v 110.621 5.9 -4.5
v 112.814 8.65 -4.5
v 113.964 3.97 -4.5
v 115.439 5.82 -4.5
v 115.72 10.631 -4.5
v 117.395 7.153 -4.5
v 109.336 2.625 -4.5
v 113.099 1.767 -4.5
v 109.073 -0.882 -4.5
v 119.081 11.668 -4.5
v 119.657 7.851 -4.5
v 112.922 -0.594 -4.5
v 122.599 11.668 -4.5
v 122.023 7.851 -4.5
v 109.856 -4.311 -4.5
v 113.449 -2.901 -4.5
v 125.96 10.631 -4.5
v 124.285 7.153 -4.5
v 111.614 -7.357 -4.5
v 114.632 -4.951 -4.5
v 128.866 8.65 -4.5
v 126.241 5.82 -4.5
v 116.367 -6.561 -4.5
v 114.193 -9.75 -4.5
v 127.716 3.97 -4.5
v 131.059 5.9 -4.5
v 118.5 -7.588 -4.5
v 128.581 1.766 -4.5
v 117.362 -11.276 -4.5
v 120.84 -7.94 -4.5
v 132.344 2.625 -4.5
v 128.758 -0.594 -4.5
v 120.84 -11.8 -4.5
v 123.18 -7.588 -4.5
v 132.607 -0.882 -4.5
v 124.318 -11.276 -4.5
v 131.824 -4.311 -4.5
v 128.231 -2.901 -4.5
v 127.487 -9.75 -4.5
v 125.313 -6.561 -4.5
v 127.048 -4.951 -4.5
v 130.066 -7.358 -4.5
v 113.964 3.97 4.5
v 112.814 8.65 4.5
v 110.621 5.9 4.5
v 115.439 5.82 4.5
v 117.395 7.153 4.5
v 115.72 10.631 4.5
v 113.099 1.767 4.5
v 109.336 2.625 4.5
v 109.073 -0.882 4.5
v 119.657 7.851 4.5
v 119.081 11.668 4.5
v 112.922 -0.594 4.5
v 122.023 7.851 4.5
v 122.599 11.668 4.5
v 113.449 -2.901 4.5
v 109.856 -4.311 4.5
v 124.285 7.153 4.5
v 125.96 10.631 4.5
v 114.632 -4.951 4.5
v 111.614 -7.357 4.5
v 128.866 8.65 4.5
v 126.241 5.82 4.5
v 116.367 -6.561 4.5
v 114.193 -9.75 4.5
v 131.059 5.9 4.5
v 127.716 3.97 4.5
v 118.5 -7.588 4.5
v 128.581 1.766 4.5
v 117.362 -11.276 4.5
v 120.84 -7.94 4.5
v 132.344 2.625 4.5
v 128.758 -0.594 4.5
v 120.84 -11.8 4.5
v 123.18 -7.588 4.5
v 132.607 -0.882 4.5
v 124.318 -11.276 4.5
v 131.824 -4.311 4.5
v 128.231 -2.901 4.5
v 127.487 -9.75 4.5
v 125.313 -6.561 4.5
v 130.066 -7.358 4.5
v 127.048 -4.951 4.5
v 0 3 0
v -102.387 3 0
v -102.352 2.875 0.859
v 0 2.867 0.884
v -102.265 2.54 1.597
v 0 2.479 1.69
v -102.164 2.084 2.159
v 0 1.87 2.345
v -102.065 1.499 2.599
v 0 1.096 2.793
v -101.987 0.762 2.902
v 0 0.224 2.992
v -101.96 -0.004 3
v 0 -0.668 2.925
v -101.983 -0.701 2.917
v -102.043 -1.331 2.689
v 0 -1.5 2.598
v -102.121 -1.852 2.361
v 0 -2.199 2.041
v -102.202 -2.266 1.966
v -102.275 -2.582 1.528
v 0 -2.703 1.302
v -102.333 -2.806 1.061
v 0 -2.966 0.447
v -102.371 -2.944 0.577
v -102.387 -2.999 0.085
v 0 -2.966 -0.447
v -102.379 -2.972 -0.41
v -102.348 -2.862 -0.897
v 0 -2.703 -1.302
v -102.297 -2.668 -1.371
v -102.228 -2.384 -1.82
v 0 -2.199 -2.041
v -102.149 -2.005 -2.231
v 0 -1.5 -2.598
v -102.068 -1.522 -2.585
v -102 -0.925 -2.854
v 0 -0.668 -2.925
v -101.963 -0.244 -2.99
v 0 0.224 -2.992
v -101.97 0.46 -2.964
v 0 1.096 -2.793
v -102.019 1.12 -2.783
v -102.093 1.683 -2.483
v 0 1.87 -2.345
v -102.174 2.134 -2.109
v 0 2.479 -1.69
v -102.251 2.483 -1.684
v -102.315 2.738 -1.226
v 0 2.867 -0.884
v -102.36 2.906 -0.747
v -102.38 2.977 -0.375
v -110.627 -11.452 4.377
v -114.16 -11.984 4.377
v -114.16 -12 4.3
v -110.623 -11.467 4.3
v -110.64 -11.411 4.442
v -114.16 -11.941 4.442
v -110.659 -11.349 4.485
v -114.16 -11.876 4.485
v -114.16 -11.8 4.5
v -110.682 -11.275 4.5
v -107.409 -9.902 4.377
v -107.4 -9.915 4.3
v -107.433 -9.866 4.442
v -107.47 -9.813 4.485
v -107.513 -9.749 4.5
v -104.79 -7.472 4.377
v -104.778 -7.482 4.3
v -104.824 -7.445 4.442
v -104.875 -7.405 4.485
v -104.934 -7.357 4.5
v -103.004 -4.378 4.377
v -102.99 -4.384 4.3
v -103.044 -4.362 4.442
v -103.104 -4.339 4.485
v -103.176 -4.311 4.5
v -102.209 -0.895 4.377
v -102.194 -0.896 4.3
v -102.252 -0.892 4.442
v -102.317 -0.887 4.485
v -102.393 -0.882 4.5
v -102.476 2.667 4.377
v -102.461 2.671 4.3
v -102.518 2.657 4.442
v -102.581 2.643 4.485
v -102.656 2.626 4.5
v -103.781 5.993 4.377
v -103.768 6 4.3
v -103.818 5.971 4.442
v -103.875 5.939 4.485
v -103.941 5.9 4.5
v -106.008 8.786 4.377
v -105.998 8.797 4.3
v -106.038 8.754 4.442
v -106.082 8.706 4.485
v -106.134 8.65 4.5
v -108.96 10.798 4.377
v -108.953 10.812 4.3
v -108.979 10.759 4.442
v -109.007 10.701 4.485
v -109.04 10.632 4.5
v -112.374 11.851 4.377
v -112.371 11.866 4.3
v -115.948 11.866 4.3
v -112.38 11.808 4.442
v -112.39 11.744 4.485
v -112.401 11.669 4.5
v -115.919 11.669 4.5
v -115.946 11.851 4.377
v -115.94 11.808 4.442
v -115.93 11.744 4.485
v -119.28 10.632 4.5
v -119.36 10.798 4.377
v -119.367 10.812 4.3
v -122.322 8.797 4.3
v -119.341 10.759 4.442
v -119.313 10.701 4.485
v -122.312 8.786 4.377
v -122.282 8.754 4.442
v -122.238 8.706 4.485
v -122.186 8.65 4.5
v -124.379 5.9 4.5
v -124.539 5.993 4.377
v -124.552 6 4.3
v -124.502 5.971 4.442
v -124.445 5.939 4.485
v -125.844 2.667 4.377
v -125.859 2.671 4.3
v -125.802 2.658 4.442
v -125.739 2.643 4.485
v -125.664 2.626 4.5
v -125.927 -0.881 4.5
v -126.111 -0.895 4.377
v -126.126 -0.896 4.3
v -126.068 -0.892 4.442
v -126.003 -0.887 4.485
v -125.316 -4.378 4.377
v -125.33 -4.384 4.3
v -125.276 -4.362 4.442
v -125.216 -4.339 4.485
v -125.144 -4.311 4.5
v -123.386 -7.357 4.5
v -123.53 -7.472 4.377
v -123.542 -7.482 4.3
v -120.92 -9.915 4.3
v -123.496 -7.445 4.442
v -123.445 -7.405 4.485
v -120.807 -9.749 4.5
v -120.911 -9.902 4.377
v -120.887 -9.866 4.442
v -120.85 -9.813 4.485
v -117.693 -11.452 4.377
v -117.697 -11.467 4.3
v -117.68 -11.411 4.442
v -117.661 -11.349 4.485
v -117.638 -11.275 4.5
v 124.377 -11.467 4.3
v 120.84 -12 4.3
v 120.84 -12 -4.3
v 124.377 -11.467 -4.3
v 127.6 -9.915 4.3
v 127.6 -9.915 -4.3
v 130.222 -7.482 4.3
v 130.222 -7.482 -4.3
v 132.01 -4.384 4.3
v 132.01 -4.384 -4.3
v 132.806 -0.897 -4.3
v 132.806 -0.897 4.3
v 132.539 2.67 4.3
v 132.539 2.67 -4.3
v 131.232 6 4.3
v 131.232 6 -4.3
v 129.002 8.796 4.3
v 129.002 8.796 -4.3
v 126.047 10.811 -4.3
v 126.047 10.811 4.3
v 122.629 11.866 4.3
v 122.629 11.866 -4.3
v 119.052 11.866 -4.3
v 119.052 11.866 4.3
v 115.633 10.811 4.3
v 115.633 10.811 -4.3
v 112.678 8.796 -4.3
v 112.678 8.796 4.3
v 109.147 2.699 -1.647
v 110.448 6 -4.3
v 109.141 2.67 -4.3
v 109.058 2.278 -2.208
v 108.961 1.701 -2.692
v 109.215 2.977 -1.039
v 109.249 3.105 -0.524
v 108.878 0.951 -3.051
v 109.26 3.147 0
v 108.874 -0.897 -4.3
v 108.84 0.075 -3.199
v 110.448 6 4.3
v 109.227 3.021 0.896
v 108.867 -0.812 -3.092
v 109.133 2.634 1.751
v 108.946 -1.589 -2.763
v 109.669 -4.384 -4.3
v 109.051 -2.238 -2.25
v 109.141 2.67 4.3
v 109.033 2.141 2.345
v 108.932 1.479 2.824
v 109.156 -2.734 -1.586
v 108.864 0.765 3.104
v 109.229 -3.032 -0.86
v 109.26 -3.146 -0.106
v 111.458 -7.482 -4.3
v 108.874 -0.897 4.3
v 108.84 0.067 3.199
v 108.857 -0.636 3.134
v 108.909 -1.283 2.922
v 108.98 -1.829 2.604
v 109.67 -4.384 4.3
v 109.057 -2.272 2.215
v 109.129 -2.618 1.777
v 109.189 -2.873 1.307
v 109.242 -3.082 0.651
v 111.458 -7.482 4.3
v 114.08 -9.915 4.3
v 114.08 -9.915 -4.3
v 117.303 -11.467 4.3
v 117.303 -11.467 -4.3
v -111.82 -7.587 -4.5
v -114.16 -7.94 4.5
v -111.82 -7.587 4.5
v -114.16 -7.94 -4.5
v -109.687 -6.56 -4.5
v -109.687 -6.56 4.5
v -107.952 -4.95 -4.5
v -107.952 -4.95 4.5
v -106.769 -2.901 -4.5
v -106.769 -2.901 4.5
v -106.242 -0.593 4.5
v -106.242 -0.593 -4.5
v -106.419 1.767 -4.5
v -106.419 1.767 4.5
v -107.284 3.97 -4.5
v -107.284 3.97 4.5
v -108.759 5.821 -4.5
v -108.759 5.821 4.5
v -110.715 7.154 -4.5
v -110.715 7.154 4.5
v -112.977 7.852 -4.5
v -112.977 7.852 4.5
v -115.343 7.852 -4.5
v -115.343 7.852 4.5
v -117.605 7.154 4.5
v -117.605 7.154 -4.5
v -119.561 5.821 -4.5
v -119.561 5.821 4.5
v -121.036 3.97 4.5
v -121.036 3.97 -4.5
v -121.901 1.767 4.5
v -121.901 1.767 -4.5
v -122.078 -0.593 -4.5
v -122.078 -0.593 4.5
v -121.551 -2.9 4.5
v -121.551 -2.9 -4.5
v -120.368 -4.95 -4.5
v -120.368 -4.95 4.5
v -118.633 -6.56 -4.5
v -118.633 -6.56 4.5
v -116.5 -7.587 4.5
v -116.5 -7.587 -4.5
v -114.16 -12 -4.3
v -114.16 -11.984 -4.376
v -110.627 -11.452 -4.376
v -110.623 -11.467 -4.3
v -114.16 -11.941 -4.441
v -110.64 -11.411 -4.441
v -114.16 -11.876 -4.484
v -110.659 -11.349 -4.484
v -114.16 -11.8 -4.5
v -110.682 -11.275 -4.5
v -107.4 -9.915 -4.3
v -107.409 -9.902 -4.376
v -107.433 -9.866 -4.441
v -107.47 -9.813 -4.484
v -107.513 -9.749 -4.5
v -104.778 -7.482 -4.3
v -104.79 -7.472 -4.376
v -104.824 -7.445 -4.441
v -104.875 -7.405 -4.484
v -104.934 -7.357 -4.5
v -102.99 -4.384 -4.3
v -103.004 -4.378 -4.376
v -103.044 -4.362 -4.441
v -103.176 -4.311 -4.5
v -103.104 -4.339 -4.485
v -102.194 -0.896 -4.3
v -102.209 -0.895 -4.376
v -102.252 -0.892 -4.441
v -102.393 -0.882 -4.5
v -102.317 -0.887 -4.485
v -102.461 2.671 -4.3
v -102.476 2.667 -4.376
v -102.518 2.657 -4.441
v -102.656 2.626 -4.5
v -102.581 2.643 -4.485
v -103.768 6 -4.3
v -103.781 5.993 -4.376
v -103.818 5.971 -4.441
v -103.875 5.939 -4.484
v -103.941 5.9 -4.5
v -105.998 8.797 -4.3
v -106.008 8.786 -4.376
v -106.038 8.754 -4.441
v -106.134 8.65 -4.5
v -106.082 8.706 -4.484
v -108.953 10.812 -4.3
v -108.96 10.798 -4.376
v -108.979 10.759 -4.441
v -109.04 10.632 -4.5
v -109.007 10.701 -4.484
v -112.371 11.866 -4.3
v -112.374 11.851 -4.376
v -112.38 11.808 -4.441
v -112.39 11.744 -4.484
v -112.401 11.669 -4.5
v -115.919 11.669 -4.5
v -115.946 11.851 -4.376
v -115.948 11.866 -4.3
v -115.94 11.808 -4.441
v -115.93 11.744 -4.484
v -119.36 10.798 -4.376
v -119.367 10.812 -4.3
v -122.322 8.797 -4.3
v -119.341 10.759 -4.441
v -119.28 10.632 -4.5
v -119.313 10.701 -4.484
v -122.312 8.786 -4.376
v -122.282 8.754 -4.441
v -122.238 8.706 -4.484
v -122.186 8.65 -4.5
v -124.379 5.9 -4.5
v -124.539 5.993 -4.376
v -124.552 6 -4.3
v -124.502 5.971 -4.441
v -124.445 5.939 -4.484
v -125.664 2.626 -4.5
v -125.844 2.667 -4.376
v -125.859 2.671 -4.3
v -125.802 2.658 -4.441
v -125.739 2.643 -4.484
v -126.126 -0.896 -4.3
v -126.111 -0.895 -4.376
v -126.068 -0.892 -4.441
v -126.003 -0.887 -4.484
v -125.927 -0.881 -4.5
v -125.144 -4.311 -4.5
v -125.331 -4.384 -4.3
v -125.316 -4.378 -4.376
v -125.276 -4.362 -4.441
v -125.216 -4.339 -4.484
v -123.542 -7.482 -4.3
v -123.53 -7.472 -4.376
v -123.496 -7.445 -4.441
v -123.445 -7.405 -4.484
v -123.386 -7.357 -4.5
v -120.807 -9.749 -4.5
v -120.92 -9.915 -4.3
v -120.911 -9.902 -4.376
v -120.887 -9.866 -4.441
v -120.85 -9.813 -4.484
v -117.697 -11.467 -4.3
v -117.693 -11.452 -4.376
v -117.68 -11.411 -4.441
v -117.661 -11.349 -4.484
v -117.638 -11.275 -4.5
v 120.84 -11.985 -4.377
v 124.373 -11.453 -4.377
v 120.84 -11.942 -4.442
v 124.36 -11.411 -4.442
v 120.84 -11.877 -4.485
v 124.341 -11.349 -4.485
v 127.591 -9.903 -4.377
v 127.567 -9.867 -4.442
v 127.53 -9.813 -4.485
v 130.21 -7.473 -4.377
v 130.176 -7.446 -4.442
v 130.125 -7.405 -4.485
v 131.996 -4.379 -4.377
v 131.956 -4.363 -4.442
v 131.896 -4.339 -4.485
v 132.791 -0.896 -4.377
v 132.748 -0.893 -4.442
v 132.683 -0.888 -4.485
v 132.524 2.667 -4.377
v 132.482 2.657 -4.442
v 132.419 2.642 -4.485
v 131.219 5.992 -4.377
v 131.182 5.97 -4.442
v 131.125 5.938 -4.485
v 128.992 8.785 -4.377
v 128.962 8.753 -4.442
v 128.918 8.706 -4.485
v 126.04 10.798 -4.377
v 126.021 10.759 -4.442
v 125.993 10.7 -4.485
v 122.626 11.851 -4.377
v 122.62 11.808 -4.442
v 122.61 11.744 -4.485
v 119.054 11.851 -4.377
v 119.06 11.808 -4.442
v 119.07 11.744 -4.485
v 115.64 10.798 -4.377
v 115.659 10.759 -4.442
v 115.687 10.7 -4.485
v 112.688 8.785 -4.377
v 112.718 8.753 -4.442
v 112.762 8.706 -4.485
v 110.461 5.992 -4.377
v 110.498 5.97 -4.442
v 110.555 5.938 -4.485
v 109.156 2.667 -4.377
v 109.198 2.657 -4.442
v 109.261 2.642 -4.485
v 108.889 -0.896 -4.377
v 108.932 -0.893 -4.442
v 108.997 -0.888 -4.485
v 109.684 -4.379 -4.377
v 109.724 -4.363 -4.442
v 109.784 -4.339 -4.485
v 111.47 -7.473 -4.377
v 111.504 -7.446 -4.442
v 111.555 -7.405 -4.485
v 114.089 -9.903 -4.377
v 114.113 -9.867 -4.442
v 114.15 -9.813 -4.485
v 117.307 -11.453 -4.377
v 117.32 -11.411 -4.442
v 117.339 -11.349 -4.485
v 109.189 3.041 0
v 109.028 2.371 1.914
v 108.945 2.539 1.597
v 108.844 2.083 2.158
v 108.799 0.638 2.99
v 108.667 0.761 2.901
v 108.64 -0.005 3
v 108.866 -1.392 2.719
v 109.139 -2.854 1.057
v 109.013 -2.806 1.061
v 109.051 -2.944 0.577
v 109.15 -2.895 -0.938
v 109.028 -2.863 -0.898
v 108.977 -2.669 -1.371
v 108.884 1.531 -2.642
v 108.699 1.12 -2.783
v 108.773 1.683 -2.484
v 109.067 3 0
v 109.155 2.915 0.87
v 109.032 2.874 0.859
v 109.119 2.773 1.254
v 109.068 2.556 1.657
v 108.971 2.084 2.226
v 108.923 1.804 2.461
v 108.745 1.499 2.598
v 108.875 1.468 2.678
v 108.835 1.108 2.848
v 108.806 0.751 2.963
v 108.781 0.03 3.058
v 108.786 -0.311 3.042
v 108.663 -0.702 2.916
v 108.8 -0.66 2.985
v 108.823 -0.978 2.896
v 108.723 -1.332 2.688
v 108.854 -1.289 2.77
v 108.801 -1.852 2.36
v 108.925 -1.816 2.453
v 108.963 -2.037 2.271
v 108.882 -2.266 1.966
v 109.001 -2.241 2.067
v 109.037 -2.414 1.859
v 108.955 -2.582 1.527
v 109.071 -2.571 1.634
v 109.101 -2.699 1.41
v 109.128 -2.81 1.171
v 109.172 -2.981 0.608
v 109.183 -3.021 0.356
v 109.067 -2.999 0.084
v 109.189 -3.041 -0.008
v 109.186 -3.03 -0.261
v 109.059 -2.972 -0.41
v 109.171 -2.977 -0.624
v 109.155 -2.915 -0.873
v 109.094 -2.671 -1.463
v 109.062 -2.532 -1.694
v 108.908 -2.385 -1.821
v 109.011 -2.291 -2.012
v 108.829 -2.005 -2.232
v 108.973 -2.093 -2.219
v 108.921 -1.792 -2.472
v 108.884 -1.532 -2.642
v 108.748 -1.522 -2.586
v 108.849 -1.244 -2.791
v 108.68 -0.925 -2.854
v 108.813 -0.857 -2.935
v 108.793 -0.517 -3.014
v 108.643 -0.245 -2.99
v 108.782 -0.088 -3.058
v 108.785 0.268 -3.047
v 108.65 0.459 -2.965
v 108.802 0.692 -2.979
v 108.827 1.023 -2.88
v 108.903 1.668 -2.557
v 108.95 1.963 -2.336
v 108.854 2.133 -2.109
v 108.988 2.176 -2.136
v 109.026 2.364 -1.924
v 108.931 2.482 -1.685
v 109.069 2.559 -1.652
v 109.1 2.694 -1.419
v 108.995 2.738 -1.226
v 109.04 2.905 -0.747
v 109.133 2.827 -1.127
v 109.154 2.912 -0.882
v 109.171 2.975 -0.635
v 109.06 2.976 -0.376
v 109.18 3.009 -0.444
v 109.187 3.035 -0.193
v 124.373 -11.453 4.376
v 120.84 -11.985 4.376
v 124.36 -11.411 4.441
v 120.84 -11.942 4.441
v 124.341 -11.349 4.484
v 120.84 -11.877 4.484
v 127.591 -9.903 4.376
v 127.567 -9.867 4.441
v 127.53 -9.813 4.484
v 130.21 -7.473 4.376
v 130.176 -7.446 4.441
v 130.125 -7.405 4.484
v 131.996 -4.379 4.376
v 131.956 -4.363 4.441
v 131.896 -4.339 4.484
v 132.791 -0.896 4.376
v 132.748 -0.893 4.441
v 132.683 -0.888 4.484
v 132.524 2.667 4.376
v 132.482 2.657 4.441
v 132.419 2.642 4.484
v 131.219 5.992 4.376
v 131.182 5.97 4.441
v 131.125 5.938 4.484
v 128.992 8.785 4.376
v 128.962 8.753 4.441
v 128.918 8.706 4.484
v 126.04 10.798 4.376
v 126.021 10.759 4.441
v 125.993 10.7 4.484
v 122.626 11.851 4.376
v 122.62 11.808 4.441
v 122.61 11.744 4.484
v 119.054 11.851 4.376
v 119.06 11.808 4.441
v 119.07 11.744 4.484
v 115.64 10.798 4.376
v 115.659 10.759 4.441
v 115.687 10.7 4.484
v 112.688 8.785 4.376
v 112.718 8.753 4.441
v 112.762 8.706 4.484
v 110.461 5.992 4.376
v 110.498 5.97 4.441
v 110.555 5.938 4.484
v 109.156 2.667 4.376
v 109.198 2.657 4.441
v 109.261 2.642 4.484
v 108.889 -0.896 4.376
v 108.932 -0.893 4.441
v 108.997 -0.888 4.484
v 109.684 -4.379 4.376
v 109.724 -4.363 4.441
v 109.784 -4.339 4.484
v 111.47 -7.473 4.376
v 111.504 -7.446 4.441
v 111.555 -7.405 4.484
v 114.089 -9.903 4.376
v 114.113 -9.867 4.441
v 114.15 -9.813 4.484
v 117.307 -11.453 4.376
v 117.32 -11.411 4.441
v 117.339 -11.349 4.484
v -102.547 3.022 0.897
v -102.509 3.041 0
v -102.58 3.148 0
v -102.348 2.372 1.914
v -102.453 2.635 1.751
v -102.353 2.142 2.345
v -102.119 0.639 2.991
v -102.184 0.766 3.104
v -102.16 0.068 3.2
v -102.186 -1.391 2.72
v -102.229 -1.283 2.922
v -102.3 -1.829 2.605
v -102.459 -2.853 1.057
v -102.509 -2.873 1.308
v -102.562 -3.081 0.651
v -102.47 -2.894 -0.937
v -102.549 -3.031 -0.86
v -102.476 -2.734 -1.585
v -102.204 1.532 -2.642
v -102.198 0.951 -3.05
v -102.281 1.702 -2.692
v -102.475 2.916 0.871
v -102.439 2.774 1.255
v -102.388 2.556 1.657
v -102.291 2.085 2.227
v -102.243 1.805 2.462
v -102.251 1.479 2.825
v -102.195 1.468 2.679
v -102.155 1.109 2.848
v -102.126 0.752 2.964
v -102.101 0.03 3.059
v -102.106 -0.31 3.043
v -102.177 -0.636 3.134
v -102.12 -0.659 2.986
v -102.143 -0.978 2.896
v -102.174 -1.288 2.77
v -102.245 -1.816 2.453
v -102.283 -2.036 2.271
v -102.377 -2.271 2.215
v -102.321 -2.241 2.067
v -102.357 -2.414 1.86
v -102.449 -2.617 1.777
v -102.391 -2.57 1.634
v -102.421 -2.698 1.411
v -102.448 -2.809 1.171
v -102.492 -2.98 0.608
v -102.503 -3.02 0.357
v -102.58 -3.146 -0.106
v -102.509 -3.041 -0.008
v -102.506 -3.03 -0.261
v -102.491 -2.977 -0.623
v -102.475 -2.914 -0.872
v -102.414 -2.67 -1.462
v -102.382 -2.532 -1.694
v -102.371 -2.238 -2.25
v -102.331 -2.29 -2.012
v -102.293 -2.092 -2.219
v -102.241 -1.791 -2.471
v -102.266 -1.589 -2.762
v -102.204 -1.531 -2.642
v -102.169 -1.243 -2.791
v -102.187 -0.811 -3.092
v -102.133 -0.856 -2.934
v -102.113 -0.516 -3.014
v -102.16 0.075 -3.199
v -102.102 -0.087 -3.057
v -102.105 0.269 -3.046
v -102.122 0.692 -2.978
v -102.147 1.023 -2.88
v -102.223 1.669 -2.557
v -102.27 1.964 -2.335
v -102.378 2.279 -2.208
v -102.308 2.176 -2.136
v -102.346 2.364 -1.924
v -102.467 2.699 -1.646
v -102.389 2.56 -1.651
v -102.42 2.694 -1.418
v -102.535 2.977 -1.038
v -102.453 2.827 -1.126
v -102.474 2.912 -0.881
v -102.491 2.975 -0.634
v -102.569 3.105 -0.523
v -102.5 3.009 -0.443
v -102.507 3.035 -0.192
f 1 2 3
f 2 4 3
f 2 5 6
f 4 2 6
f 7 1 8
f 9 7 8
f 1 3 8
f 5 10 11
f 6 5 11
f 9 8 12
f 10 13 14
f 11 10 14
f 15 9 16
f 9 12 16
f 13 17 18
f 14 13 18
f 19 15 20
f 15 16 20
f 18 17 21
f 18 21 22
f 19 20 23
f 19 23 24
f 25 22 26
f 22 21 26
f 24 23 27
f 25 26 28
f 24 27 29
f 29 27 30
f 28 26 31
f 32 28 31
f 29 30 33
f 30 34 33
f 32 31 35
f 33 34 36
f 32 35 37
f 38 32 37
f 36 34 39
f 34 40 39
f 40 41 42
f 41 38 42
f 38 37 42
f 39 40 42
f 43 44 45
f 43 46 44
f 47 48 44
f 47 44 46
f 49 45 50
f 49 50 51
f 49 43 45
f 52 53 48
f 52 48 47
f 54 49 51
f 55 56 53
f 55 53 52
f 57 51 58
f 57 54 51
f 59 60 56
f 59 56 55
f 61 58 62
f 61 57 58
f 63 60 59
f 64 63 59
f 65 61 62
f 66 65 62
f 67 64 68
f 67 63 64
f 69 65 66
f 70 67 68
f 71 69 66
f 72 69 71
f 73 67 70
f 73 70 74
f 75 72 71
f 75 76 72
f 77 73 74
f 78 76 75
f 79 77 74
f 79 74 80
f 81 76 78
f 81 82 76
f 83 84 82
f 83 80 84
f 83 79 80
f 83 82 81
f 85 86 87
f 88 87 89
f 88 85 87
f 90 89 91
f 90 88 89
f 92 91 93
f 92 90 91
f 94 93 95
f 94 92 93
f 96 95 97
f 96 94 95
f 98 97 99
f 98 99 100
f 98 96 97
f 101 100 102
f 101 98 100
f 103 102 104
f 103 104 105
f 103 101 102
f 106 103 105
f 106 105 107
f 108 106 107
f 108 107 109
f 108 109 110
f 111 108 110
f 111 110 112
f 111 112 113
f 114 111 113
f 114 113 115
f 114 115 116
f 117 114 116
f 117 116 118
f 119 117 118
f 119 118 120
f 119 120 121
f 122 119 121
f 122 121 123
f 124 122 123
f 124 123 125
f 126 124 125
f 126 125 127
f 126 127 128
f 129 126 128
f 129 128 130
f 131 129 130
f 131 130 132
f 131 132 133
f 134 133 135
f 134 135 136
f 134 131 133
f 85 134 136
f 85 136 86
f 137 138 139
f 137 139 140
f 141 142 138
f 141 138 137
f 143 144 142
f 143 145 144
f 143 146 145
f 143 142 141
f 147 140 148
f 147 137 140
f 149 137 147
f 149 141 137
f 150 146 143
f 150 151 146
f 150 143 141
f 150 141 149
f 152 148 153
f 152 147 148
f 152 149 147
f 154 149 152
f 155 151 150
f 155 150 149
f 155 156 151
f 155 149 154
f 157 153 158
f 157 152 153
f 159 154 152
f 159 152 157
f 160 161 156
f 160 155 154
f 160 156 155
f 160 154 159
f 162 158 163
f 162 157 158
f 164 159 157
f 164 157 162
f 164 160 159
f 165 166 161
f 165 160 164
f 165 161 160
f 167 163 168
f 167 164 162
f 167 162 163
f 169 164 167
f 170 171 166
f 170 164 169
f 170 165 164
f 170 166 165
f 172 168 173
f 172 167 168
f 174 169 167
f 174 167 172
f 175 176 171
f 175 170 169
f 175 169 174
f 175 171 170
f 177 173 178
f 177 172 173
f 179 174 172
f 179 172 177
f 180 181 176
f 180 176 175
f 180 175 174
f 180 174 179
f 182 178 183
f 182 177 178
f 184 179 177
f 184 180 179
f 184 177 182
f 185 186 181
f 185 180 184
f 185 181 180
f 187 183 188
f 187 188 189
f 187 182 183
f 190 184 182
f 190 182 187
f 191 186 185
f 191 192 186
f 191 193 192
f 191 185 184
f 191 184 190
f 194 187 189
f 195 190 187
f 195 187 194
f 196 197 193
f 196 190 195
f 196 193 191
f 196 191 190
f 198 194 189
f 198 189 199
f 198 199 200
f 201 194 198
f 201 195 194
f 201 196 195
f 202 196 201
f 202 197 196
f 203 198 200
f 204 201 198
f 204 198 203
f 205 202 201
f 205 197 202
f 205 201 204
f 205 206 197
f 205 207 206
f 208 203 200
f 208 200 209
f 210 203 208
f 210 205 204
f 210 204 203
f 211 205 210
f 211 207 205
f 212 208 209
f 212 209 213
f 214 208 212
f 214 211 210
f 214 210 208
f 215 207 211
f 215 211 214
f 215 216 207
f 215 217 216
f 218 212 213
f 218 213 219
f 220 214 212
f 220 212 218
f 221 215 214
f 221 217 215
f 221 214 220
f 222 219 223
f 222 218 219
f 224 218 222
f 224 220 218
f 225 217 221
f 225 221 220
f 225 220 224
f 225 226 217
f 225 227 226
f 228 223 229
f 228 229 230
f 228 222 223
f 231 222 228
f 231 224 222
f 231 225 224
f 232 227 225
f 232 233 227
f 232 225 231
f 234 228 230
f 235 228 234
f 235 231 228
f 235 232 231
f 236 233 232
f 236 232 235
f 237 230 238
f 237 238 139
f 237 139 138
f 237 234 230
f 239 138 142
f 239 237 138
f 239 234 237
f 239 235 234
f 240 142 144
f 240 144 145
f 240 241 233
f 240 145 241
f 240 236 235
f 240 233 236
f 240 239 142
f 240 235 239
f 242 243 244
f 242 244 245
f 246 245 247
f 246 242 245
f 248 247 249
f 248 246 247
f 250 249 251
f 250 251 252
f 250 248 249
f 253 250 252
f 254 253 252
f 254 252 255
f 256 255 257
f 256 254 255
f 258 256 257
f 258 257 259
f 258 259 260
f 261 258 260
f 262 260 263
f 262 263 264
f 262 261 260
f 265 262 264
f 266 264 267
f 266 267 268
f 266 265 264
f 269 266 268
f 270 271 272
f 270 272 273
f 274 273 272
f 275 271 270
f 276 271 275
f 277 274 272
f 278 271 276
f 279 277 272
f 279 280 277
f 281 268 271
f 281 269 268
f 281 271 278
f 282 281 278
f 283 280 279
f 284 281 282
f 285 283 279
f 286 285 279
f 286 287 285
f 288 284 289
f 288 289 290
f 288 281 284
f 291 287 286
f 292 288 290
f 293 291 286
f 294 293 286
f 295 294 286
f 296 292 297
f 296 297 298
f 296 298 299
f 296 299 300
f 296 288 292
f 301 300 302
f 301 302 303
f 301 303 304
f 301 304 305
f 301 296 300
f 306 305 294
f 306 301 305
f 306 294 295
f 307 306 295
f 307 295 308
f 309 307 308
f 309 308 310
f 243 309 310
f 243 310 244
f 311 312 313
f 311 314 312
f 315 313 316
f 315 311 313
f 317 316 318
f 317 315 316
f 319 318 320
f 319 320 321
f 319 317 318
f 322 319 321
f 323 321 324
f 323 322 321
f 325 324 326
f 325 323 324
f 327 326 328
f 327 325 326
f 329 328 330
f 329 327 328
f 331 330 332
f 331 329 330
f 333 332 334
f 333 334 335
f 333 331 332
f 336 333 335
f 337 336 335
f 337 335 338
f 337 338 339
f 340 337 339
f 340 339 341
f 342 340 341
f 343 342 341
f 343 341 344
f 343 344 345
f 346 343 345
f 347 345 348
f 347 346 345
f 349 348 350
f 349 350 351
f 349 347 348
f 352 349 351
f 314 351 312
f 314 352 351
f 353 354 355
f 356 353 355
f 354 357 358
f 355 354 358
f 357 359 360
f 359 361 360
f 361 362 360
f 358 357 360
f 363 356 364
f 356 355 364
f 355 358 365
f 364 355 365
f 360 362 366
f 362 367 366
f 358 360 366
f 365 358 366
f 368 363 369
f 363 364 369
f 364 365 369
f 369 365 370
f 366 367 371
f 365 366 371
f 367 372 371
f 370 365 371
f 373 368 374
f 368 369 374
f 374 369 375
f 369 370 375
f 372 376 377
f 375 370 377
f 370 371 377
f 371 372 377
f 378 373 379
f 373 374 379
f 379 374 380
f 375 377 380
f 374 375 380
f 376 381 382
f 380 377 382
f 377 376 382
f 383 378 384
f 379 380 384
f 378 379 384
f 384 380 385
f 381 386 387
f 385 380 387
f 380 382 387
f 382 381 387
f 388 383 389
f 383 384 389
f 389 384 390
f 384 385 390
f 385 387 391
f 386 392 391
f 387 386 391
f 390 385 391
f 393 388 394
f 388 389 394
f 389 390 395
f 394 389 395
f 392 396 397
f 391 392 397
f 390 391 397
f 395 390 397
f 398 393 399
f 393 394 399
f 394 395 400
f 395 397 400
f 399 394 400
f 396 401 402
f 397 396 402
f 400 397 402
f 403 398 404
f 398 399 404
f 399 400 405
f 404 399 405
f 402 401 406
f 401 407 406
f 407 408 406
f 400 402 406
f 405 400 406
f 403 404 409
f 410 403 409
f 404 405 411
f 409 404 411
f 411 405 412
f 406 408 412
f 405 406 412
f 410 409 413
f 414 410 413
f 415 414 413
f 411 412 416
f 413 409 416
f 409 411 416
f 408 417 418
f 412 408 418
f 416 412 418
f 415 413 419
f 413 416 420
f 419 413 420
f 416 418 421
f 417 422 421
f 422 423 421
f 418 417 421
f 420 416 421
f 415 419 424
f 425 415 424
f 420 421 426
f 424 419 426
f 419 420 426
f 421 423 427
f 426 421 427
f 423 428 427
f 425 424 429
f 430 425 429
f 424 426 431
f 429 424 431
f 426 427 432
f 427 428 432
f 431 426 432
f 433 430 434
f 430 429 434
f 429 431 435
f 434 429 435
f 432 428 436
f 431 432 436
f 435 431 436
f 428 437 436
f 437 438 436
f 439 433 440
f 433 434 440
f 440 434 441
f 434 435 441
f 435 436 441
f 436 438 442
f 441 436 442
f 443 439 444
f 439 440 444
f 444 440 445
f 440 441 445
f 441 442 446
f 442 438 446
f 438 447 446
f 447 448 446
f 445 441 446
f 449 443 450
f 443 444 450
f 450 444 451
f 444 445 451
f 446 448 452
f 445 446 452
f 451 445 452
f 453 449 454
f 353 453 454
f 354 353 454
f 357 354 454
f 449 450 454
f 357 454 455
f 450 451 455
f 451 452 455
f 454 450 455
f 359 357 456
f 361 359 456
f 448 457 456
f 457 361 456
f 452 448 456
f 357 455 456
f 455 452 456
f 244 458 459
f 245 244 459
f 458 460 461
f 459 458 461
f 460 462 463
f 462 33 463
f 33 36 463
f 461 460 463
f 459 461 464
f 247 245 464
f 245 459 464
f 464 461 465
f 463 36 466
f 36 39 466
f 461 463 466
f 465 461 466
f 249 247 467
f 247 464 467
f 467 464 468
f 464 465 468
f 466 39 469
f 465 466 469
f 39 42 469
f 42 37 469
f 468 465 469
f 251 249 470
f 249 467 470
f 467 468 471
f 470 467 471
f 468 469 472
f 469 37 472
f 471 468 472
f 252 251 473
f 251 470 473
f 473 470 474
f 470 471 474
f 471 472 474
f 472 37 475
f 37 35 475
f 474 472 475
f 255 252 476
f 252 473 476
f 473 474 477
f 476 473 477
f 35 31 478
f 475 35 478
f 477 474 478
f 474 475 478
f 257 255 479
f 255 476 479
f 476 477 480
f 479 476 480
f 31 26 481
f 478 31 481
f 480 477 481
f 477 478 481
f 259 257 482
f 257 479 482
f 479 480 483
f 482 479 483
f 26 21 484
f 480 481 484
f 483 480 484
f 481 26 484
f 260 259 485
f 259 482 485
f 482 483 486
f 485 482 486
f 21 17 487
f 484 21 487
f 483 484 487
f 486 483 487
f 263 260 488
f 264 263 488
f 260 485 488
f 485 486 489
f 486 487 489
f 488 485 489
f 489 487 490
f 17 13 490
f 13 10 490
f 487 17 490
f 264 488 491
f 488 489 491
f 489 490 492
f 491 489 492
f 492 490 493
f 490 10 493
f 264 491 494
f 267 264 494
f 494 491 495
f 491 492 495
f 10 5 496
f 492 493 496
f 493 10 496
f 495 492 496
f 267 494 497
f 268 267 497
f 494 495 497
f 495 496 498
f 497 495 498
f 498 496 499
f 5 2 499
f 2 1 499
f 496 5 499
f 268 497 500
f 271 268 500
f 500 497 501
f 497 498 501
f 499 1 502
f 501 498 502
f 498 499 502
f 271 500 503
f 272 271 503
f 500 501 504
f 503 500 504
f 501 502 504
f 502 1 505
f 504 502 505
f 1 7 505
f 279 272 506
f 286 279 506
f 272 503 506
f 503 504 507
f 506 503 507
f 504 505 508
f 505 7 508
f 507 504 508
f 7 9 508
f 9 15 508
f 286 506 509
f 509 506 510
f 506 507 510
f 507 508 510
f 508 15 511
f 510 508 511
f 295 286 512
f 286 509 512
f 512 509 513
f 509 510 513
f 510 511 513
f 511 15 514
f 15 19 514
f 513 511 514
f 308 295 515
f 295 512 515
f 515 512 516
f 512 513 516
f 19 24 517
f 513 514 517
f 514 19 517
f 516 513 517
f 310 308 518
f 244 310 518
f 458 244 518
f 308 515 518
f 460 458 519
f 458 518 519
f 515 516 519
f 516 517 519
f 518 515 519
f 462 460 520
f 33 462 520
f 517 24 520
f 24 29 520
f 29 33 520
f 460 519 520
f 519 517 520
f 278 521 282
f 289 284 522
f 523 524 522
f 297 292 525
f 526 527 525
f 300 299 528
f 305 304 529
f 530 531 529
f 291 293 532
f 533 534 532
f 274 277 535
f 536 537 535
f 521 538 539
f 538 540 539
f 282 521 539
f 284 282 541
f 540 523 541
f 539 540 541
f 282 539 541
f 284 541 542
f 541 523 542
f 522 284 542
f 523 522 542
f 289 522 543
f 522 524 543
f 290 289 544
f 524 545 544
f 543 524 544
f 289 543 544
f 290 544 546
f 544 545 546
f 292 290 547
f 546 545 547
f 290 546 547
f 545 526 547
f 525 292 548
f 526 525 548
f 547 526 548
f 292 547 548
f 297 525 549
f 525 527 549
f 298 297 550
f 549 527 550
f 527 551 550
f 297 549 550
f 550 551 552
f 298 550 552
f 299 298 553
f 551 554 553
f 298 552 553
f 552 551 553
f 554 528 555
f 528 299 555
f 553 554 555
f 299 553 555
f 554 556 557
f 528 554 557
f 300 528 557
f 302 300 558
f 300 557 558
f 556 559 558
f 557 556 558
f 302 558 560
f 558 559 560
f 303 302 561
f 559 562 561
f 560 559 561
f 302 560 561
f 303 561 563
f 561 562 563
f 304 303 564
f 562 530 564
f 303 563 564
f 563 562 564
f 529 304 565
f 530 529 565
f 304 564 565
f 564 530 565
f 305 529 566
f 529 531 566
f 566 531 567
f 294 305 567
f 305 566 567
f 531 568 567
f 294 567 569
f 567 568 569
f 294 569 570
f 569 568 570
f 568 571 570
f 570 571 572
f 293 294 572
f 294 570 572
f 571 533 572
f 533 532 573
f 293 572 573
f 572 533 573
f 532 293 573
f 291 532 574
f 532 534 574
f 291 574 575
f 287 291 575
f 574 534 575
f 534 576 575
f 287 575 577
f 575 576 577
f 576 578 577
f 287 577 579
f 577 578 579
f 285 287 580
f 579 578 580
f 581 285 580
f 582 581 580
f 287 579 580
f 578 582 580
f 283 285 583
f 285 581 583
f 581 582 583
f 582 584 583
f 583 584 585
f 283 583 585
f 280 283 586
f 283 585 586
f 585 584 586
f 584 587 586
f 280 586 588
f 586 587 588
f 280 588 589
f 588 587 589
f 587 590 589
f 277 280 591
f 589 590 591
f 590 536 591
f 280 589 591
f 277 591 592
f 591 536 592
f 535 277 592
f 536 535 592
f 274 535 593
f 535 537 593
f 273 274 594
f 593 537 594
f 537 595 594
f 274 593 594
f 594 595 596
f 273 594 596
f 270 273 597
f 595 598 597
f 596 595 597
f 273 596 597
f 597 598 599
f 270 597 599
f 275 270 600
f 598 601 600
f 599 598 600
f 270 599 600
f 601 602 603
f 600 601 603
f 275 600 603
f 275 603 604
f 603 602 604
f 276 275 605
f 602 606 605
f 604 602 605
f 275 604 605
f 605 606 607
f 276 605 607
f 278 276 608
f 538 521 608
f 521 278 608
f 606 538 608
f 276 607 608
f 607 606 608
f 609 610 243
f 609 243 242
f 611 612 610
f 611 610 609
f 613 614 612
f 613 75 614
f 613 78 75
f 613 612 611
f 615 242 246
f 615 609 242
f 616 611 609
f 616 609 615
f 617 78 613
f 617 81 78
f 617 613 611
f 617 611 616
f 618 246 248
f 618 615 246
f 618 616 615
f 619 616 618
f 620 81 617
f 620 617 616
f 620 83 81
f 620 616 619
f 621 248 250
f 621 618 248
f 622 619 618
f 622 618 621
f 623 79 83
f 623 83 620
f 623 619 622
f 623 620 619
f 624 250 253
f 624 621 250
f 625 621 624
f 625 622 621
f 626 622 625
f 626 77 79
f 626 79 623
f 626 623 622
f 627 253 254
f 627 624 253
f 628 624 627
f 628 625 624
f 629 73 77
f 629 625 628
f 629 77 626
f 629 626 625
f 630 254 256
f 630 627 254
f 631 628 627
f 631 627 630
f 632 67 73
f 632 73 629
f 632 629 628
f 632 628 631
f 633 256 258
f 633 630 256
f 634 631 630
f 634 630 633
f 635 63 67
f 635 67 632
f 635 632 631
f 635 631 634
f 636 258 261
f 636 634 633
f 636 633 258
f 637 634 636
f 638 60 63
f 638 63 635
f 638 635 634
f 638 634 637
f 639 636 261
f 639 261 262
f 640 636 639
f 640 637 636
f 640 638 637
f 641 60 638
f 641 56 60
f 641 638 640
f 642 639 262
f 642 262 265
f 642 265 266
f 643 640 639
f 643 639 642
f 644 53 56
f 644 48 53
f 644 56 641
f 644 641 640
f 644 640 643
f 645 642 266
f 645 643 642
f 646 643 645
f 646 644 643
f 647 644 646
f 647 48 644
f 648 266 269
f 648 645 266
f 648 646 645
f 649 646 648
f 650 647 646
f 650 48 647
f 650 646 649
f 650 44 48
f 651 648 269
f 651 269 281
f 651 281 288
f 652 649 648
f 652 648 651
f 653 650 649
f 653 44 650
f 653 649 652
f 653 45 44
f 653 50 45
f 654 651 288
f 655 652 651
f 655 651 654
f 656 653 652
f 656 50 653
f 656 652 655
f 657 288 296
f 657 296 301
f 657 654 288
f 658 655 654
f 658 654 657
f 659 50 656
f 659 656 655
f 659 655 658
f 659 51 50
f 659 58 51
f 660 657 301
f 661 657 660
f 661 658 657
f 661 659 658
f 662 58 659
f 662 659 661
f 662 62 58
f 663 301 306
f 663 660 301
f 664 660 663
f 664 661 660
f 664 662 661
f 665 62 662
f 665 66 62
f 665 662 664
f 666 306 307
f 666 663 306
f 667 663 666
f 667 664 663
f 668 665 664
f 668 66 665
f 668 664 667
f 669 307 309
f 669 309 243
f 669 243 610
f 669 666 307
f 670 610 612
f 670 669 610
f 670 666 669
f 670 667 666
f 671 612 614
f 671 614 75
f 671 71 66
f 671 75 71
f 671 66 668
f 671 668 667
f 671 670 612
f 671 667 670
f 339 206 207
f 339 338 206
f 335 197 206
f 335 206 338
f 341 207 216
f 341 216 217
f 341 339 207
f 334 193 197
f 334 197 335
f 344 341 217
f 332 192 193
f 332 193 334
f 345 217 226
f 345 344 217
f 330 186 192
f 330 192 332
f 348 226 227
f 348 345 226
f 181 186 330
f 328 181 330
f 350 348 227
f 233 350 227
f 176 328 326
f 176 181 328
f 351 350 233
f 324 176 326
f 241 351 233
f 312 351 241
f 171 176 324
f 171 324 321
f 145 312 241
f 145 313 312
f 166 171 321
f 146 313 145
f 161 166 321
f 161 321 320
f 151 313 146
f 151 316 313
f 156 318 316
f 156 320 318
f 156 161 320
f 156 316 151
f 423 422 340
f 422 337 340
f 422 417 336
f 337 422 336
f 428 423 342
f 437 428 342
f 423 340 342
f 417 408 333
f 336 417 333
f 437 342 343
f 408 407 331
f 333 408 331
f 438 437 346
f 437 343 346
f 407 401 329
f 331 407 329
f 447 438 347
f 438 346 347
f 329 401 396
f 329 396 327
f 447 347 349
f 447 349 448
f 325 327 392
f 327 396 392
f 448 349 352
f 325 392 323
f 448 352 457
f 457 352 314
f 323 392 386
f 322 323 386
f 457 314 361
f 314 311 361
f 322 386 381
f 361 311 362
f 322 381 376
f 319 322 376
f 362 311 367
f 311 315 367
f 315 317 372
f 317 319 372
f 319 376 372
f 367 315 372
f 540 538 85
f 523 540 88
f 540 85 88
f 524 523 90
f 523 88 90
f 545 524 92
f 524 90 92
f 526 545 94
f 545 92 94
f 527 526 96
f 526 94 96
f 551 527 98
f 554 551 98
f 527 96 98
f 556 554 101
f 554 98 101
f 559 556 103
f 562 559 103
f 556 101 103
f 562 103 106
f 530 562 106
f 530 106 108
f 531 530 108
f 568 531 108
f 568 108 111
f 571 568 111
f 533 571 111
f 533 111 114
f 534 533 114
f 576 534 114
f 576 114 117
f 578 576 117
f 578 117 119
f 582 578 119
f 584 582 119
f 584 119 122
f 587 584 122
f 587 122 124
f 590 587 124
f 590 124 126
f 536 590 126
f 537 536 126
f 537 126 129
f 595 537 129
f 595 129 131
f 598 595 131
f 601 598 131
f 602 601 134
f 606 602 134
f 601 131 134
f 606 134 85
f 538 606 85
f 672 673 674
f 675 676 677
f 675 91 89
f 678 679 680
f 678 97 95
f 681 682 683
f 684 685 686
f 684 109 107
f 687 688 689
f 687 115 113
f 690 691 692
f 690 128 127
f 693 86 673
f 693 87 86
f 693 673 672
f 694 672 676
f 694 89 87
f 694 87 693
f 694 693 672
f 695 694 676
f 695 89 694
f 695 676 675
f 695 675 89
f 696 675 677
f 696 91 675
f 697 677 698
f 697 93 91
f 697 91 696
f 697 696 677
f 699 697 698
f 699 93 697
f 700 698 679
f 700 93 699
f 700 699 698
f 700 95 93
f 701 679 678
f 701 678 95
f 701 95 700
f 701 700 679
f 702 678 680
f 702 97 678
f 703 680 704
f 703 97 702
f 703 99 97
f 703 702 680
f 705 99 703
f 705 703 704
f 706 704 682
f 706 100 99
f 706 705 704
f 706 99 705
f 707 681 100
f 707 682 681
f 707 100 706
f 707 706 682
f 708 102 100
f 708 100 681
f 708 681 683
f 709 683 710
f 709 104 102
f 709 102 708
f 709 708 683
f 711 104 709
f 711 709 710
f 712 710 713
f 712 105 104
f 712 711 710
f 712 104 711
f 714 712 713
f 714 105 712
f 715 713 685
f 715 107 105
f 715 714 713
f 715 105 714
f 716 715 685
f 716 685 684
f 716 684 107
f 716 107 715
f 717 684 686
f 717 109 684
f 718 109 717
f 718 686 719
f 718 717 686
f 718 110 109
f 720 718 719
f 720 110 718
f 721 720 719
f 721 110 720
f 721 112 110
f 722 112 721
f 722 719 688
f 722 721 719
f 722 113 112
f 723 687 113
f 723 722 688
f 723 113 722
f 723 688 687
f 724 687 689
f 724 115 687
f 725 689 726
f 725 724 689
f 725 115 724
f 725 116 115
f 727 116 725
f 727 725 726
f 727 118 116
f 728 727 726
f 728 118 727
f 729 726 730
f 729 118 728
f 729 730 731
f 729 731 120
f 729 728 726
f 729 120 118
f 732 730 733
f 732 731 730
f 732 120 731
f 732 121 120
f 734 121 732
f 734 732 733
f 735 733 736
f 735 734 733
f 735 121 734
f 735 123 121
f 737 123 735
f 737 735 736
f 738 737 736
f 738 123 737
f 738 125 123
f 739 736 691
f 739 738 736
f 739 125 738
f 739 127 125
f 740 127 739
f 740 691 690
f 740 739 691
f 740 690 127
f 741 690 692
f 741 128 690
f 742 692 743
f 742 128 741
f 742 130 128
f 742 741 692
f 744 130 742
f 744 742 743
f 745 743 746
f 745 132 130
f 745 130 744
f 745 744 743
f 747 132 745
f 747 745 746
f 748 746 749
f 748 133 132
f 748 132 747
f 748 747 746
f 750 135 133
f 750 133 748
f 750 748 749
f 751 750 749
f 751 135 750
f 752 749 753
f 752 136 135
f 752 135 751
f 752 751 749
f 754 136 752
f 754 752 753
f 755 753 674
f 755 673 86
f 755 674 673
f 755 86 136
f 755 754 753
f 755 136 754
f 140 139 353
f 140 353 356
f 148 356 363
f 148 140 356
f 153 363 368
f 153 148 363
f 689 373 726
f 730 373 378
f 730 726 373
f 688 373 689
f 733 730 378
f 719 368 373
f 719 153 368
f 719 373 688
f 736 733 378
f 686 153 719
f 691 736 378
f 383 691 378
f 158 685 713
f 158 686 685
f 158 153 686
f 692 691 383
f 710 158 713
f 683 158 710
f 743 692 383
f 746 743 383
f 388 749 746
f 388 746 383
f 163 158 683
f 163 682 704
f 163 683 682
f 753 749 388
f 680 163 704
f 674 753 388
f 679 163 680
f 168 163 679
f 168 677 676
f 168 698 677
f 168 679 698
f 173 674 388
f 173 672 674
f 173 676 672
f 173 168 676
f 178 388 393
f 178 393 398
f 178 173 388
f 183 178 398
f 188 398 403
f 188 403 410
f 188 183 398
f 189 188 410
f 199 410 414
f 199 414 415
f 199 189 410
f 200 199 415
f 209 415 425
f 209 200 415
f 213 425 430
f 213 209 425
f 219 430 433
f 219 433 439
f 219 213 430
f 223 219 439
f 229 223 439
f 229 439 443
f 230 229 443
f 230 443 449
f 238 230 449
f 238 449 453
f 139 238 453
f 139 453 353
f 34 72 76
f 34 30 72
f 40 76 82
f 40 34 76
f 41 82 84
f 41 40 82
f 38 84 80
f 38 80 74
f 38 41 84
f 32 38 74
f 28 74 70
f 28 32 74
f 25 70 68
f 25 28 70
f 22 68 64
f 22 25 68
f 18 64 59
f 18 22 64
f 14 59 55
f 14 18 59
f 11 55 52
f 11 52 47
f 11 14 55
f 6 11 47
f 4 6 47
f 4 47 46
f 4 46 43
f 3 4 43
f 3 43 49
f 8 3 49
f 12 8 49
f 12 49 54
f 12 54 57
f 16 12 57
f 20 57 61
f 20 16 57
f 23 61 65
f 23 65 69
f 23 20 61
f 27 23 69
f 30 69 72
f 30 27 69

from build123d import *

# Parameters (mm, degrees)
SKETCH1_R                            = 12
SKETCH1_R_2                          = 7.94
BOSS_EXTRUDE1_DEPTH                  = 4.5
BOSS_EXTRUDE1_2_DEPTH                = 4.5
BOSS_EXTRUDE2_REACH                  = 135.457
BOSS_EXTRUDE2_END_RADIUS             = 12
SKETCH3_R                            = 3
BOSS_EXTRUDE2_DIRECTION_2_REACH      = 135.457
BOSS_EXTRUDE2_DIRECTION_2_END_RADIUS = 12
FILLET1_R                            = 0.2
BODY_MOVE_COPY2_ANGLE                = 90


with BuildPart() as part:
    # Sketch1 → Boss-Extrude1 (new, symmetric)
    with BuildSketch(Plane(origin=(0, 0, 0), x_dir=(1, 0, 0), z_dir=(0, 1, 0))):
        with Locations(Location((-114.16, 0, 0), (0, 0, 270))):
            Circle(SKETCH1_R)
        with Locations(Location((-114.16, 0, 0), (0, 0, 270))):
            Circle(SKETCH1_R_2, mode=Mode.SUBTRACT)
    extrude(amount=BOSS_EXTRUDE1_DEPTH, both=True)



with BuildPart() as body_2:
    # Sketch1 → Boss-Extrude1 2 (new, symmetric)
    with BuildSketch(Plane(origin=(0, 0, 0), x_dir=(1, 0, 0), z_dir=(0, 1, 0))):
        with Locations(Location((120.84, 0, 0), (0, 0, 270))):
            Circle(SKETCH1_R)
        with Locations(Location((120.84, 0, 0), (0, 0, 270))):
            Circle(SKETCH1_R_2, mode=Mode.SUBTRACT)
    extrude(amount=BOSS_EXTRUDE1_2_DEPTH, both=True)


with BuildPart() as part_1:
    add(part.part)

    add(body_2.part)  # Boss-Extrude2 merges body 2
    # Boss-Extrude2: up to this cylinder (the profile starts outside it)
    boss_extrude2_end = Plane(origin=(120.84, 0, 0), z_dir=(0, -1, 0)) * Cylinder(BOSS_EXTRUDE2_END_RADIUS, 295.914, mode=Mode.PRIVATE)
    # Sketch3 → Boss-Extrude2 (add, up to the surface)
    with BuildSketch(Plane(origin=(0, 0, 0), x_dir=(0, 0, -1), z_dir=(1, 0, 0)), mode=Mode.PRIVATE) as boss_extrude2_sk1:
        Circle(SKETCH3_R)
    boss_extrude2_tool1 = extrude(boss_extrude2_sk1.sketch, amount=BOSS_EXTRUDE2_REACH, mode=Mode.PRIVATE) - boss_extrude2_end
    add(boss_extrude2_tool1.solids().sort_by_distance((0, 0, 0))[0])

    # Boss-Extrude2 direction 2: up to this cylinder (the profile starts outside it)
    boss_extrude2_direction_2_end = Plane(origin=(-114.16, 0, 0), z_dir=(0, -1, 0)) * Cylinder(BOSS_EXTRUDE2_DIRECTION_2_END_RADIUS, 295.914, mode=Mode.PRIVATE)
    # Sketch3 → Boss-Extrude2 direction 2 (add, up to the surface)
    with BuildSketch(Plane(origin=(0, 0, 0), x_dir=(0, 0, -1), z_dir=(1, 0, 0)), mode=Mode.PRIVATE) as boss_extrude2_direction_2_sk1:
        Circle(SKETCH3_R)
    boss_extrude2_direction_2_tool1 = extrude(boss_extrude2_direction_2_sk1.sketch, amount=-BOSS_EXTRUDE2_DIRECTION_2_REACH, mode=Mode.PRIVATE) - boss_extrude2_direction_2_end
    add(boss_extrude2_direction_2_tool1.solids().sort_by_distance((0, 0, 0))[0])

    # Fillet1
    fillet1_edges = [part_1.edges().sort_by_distance(p)[0] for p in [
        (-102.541049963, 0, 3.000000015),
        (109.221049963, 0, 3.000000015),
        (120.84, 4.5, -12),
        (120.84, -4.5, -12),
        (-114.16, -4.5, -12),
        (-114.16, 4.5, -12),
    ]]
    fillet(fillet1_edges, radius=FILLET1_R)


with BuildPart() as part_2:
    # Body-Move/Copy2: moved
    add(part_1.part.rotate(Axis((0, 0, 0), (0.9999999999964604, 0, -2.660711581397482e-06)), BODY_MOVE_COPY2_ANGLE))


solid = part_2.part
